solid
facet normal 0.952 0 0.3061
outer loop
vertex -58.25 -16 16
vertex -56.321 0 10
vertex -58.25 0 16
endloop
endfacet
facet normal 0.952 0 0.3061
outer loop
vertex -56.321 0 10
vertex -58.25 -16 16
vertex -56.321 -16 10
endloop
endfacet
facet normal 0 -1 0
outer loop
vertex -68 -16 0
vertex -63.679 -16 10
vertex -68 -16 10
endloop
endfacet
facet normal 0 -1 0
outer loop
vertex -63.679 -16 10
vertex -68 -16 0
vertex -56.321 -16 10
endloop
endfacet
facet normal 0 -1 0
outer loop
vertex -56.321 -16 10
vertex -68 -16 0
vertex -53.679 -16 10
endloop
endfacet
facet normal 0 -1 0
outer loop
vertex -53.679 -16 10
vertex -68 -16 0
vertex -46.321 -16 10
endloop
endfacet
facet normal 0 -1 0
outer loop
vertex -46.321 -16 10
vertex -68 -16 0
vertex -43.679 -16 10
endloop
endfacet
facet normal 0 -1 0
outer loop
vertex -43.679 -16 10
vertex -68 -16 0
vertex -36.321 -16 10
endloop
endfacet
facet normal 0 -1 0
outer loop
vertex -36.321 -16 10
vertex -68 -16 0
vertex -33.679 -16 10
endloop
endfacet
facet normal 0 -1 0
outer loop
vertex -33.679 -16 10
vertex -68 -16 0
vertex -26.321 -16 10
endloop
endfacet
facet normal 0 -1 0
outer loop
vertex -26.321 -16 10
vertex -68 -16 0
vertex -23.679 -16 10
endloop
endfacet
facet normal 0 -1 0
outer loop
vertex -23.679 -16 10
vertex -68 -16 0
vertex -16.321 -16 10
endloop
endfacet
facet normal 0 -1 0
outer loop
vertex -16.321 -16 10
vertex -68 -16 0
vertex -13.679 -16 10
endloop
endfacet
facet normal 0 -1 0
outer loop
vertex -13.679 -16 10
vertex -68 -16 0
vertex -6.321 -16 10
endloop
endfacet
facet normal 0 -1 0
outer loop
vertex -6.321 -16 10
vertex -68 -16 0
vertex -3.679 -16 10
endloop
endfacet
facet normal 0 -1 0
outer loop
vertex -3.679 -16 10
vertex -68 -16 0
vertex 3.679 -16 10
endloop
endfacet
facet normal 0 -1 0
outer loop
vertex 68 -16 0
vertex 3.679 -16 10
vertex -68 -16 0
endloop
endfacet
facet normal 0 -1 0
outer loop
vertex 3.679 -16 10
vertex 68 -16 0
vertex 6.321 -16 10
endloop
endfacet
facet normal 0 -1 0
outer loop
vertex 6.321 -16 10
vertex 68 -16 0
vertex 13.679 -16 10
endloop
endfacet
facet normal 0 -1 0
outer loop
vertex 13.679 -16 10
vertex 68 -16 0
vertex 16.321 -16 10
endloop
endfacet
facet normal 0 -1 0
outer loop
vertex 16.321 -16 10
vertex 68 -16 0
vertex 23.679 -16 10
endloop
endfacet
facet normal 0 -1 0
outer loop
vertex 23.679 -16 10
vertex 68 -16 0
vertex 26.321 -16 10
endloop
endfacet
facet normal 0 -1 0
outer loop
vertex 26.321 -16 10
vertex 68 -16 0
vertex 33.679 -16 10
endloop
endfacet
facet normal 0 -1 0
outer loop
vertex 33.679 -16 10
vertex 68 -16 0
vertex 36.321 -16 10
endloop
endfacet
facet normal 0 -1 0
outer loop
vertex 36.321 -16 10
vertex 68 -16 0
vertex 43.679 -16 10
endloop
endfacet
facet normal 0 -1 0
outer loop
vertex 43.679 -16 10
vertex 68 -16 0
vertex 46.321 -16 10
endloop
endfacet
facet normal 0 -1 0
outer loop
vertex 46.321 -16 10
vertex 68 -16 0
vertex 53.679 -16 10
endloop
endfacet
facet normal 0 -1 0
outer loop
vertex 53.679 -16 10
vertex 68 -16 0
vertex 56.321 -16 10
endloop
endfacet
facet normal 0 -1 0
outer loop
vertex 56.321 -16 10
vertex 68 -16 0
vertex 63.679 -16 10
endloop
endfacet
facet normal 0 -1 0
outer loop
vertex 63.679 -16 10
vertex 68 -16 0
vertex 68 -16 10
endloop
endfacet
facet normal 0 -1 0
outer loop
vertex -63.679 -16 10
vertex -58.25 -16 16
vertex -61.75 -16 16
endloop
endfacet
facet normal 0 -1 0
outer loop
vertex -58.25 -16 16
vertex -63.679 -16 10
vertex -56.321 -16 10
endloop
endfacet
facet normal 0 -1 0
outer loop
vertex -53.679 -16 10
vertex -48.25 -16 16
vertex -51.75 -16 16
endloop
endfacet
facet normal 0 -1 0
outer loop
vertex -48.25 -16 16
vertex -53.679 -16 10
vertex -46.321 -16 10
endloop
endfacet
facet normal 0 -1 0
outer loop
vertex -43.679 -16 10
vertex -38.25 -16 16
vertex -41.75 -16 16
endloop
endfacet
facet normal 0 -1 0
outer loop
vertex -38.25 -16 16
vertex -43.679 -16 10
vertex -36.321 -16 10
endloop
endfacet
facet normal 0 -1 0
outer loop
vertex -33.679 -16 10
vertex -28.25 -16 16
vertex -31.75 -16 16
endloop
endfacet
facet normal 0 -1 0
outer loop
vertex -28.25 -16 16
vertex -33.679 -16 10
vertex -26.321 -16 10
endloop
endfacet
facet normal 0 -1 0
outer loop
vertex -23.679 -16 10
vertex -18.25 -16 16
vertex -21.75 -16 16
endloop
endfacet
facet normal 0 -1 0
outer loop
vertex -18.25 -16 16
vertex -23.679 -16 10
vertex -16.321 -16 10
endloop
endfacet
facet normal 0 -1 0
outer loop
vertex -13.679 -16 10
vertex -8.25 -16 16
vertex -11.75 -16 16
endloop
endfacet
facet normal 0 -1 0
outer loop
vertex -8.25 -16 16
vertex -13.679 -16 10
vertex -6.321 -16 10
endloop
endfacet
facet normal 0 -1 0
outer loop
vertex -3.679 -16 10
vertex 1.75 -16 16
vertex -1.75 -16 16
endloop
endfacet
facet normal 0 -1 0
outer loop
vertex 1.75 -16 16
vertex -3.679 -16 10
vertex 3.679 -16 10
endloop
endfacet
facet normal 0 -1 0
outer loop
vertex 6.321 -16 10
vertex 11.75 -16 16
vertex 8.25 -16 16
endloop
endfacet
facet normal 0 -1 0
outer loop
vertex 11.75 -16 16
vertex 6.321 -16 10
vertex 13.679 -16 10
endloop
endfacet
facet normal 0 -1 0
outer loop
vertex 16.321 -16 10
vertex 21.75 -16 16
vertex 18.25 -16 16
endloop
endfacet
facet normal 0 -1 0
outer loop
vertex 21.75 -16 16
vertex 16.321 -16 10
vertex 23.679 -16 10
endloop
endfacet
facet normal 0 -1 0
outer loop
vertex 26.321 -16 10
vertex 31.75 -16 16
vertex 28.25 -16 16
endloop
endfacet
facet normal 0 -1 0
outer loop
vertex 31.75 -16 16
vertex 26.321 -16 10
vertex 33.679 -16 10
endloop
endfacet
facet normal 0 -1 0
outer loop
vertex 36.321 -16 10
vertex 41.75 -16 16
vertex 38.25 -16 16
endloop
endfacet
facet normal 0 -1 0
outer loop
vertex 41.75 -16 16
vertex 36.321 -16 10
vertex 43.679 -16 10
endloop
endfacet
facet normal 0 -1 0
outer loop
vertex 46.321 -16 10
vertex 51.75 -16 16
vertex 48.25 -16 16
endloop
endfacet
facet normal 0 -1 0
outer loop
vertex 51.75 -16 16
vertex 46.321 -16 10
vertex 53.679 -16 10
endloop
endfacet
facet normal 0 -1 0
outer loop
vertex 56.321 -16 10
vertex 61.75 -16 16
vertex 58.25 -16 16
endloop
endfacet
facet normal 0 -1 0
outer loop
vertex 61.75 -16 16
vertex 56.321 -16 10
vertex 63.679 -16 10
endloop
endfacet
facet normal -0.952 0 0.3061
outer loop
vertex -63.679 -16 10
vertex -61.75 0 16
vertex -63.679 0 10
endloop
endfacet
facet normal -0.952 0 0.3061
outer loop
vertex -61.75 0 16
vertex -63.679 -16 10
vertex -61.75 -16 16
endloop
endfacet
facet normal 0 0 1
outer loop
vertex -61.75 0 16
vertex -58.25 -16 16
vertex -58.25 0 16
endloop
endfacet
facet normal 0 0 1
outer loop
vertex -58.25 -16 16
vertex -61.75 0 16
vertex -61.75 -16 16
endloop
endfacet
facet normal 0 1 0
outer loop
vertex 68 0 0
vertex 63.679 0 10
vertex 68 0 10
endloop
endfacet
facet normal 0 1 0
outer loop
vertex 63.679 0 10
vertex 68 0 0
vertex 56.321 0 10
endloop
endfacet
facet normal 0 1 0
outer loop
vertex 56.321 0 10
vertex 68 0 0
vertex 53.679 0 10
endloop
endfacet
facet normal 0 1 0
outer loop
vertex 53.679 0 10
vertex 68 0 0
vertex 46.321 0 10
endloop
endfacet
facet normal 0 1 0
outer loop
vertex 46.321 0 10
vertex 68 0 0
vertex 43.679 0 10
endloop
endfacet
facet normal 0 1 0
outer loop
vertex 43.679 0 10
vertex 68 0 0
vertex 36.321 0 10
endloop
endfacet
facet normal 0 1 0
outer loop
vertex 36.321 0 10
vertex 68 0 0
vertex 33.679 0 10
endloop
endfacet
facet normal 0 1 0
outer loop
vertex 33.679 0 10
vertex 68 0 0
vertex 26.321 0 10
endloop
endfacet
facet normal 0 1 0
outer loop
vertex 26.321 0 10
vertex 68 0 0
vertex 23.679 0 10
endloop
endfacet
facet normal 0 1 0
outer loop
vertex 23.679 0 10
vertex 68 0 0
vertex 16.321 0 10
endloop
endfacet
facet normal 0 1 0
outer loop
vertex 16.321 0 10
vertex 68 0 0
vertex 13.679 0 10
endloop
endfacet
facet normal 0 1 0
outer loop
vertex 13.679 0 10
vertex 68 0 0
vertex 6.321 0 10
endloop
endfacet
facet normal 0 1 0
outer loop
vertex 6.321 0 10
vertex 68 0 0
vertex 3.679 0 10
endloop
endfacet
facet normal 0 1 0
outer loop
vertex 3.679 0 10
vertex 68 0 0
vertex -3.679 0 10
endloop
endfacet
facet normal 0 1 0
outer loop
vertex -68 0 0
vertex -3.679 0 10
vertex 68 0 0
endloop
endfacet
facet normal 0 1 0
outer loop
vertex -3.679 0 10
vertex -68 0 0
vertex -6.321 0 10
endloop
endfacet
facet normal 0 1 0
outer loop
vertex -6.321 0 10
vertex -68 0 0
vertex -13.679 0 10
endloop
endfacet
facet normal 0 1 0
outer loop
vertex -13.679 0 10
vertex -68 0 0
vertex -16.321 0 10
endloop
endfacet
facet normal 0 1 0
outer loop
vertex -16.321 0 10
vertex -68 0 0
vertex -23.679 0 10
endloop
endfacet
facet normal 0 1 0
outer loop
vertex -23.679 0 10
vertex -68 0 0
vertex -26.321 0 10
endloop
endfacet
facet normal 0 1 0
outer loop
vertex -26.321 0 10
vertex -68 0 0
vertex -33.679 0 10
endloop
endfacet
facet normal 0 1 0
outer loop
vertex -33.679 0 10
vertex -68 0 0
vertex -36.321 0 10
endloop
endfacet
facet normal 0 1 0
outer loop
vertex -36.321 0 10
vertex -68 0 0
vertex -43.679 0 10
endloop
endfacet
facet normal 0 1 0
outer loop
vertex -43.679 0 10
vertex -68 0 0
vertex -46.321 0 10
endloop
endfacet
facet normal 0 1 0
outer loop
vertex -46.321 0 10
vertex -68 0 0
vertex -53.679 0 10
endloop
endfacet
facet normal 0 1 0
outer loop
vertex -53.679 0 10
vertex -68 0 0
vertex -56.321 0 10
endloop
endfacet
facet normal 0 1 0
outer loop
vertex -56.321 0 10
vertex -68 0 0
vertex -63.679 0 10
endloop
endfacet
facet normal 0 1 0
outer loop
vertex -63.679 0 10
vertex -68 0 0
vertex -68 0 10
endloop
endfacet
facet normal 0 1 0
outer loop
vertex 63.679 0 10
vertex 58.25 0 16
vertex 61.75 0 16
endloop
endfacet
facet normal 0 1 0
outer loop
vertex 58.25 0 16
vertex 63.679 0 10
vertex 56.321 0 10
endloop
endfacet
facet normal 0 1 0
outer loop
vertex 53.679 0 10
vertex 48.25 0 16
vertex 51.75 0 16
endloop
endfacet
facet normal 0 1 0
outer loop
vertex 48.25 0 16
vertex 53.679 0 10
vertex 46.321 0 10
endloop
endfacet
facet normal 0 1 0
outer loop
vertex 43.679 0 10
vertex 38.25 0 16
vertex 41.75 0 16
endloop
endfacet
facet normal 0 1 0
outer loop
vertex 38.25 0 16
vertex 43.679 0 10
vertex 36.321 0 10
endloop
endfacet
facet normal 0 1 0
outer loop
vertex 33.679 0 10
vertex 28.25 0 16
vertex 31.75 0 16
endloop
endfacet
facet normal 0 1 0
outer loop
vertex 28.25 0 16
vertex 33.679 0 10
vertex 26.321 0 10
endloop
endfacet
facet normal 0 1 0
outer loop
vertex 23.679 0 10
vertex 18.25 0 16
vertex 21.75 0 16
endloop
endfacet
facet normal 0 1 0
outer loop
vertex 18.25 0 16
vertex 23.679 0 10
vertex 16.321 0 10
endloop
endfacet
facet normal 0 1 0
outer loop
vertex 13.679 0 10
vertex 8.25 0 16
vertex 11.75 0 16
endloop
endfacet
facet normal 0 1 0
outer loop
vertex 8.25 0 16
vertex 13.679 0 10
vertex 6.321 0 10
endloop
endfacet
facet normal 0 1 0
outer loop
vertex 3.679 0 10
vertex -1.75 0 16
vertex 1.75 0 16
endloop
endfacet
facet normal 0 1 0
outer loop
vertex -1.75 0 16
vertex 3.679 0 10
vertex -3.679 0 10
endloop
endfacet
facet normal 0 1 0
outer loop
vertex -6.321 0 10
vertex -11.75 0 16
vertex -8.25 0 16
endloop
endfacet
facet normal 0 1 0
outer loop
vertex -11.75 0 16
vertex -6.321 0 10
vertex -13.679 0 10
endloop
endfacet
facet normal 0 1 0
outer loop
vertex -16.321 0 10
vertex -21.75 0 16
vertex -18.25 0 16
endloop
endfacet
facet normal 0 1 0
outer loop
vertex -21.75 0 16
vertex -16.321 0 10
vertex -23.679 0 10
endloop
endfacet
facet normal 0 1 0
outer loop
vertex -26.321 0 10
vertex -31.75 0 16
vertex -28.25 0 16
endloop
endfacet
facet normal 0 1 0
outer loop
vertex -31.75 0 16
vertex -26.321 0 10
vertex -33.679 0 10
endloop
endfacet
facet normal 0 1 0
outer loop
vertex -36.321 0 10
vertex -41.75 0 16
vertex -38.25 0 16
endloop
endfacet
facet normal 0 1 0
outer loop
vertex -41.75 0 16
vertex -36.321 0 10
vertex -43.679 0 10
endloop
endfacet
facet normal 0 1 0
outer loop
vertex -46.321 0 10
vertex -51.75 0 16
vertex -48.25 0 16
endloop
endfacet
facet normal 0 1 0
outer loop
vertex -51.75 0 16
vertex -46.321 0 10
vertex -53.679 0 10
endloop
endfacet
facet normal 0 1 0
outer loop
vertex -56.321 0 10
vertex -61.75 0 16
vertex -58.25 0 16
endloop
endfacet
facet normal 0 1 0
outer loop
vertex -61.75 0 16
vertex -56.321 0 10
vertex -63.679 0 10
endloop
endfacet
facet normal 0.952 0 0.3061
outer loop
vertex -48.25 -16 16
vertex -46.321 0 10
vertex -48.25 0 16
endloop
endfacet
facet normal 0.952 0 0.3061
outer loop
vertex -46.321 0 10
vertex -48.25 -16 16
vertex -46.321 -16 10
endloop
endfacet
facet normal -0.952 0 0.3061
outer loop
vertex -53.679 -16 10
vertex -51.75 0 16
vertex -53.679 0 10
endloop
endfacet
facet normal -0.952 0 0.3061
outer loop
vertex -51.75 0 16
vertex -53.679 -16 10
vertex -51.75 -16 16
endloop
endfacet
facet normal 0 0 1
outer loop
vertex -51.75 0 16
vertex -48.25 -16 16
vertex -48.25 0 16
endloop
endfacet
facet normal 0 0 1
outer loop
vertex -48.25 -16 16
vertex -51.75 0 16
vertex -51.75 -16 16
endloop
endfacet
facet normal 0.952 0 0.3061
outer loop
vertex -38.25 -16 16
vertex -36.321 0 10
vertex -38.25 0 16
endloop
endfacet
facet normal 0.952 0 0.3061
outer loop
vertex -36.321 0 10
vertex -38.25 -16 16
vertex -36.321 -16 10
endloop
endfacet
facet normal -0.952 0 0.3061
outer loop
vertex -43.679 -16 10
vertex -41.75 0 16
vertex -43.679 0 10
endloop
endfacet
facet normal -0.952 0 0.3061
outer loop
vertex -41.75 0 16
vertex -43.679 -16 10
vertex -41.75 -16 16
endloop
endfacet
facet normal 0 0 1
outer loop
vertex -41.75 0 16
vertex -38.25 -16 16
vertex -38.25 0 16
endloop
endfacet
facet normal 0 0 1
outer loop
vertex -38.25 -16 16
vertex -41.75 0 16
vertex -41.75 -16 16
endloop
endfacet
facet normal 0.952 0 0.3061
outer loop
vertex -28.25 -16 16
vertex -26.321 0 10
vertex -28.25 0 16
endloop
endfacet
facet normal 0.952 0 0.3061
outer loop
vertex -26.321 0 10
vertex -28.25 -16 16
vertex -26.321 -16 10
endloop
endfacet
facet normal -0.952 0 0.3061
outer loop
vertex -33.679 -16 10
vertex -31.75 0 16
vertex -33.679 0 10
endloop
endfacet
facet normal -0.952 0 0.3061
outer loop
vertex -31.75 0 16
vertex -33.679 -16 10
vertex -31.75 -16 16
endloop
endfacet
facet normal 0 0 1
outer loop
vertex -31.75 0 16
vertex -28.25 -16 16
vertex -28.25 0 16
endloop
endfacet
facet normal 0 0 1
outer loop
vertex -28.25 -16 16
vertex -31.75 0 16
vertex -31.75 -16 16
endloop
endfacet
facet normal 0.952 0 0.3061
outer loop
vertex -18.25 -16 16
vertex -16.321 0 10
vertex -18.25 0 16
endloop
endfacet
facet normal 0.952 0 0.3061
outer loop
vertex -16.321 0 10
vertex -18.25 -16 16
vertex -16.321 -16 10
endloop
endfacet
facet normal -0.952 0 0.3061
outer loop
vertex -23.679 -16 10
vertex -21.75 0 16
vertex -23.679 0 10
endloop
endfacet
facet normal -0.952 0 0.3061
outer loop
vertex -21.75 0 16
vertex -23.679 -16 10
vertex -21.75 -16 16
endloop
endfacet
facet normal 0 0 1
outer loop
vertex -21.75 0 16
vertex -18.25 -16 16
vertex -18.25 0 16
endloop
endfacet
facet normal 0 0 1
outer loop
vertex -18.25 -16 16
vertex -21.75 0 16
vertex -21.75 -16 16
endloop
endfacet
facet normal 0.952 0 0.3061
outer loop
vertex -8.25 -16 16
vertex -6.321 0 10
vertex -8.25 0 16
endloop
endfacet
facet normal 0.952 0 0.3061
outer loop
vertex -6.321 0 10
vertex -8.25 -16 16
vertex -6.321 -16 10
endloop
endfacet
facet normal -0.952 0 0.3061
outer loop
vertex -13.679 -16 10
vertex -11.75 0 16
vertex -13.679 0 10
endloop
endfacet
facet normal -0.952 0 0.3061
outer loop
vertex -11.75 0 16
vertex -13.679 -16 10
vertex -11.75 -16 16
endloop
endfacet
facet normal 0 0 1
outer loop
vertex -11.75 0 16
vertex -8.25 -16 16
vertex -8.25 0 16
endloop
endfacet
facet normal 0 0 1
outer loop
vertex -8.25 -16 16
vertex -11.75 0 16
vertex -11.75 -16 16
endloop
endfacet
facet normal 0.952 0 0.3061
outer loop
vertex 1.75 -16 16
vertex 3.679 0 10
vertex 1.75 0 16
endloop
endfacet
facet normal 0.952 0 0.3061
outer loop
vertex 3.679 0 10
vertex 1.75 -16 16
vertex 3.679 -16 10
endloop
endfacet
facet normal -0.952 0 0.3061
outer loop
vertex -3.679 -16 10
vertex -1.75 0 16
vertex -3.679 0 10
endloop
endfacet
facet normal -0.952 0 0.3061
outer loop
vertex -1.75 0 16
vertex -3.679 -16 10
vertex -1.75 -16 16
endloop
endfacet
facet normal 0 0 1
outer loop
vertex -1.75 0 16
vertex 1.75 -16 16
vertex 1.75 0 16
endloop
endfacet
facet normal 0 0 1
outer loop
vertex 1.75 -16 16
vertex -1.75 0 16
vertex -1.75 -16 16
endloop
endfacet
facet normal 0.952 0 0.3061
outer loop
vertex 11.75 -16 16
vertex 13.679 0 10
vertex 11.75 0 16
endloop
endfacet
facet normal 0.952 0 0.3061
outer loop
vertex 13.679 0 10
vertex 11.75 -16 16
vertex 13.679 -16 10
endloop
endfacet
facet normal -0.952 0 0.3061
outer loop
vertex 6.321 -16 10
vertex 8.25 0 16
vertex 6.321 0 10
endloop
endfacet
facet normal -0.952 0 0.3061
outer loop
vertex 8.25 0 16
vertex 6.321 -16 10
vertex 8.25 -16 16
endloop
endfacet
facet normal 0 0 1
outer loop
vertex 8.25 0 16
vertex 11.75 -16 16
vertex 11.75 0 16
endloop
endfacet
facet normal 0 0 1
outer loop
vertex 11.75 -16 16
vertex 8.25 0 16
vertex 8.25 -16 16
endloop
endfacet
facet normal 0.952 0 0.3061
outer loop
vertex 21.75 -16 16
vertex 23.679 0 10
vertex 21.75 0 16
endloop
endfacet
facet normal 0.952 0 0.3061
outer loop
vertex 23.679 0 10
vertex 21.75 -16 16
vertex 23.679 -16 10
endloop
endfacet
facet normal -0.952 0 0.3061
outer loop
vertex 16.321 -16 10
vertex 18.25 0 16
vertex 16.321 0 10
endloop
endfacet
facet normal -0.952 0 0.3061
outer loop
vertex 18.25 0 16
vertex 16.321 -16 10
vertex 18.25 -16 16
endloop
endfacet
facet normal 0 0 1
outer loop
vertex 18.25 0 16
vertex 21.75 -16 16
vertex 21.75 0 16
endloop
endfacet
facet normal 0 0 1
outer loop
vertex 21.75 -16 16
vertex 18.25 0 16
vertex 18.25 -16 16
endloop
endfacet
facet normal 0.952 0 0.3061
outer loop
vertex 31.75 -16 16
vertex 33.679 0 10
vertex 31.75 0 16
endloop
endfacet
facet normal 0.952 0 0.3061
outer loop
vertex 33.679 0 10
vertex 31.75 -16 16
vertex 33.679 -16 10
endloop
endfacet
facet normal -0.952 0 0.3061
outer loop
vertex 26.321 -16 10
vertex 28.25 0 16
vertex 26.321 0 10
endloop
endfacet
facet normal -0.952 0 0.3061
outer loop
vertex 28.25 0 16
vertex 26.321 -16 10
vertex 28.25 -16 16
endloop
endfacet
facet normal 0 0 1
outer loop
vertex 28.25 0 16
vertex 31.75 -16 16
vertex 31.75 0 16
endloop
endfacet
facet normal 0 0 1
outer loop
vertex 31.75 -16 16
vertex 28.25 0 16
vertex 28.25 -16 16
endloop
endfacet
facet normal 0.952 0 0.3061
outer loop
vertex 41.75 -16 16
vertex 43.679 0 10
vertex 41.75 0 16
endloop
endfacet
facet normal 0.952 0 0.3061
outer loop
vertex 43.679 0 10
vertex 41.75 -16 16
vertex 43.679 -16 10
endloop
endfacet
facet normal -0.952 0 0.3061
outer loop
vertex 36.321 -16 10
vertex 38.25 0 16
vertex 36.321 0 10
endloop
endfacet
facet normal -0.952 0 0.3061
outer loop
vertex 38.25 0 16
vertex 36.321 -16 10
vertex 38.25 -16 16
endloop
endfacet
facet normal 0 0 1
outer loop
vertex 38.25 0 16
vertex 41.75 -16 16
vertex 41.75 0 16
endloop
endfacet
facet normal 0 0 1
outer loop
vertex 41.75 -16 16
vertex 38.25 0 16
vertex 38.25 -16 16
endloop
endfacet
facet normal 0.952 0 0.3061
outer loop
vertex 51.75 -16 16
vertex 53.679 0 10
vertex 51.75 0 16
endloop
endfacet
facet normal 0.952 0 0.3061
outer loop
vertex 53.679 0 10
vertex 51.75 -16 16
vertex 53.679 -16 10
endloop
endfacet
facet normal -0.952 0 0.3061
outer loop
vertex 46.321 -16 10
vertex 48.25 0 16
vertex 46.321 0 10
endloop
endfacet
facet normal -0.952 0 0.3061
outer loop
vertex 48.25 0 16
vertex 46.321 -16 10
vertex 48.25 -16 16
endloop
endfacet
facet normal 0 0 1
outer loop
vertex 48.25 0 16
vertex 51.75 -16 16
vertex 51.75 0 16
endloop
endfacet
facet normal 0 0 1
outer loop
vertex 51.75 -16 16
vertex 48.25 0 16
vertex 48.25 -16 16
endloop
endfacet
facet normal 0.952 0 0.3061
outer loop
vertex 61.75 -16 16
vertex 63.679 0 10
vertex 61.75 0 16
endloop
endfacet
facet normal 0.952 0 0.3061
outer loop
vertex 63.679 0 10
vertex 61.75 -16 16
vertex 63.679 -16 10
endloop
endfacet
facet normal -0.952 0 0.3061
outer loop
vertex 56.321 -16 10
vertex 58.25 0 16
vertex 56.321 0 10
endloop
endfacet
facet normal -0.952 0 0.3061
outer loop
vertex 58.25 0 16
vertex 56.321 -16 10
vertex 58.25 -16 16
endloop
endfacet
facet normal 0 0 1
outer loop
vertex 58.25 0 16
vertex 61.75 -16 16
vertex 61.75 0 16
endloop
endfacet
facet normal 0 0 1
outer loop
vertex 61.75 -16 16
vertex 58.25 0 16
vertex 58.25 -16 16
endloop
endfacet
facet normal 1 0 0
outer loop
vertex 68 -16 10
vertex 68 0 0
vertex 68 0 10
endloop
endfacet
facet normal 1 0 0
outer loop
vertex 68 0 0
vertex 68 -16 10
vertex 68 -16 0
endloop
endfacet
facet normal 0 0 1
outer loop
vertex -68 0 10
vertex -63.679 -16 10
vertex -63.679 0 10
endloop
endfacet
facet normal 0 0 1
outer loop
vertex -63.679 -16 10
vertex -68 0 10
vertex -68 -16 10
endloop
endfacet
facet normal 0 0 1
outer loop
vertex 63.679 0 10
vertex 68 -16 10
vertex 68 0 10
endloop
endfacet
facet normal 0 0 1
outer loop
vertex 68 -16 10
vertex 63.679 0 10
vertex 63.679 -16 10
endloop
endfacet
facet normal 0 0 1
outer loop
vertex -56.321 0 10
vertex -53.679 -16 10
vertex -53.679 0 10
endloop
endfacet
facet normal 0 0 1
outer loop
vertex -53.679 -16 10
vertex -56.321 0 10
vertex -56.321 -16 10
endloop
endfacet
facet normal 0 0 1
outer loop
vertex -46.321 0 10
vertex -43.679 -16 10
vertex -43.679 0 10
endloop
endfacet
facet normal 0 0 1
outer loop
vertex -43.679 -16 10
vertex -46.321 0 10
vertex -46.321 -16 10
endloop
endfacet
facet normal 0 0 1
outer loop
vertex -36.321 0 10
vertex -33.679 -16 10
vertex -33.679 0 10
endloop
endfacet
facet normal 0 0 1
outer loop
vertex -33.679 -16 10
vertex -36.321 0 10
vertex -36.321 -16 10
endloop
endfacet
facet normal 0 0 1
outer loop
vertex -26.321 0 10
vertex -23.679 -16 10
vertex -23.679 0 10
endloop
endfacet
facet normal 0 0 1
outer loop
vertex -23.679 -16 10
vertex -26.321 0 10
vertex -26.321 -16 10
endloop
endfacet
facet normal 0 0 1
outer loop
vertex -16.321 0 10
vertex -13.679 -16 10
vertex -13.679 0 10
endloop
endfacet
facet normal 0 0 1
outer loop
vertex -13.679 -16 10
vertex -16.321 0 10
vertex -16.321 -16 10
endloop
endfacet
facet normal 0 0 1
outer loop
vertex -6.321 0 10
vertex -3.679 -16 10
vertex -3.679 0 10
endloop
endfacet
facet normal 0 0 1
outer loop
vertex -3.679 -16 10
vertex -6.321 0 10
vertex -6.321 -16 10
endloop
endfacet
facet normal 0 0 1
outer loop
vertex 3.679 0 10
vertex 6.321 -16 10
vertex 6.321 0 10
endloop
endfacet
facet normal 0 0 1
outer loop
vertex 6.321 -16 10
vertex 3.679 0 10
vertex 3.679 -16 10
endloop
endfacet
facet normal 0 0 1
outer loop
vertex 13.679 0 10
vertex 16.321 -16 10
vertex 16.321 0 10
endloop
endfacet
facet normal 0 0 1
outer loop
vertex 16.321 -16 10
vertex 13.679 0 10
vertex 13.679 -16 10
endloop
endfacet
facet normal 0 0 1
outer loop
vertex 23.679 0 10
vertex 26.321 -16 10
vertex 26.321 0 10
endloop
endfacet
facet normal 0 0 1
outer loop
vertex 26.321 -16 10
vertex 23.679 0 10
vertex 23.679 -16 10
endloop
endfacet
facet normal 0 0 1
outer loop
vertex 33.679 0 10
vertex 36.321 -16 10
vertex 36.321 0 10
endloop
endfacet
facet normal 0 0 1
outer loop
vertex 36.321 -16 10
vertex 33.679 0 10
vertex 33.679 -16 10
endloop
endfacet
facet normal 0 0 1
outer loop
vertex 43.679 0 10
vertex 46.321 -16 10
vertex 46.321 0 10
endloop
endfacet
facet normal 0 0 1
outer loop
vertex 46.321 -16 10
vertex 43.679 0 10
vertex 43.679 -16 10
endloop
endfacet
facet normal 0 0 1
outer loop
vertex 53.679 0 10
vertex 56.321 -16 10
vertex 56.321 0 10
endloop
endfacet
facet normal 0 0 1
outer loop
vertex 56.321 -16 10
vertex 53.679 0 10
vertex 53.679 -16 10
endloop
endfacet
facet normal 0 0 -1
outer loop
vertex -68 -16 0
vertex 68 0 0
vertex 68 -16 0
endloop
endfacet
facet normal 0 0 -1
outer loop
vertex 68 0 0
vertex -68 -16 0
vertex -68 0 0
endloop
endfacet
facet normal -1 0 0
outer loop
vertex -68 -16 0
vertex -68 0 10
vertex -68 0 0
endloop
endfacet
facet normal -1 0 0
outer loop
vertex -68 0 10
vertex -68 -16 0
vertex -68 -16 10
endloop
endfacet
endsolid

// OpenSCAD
$fn = 32;

// ----------------------------------------------------------------------
// Toothed rack, 13 teeth
// 10 mm pitch, 6 mm teeth
// ----------------------------------------------------------------------

// --- parameters (mm) ---
bar_w = 16;     // bar width (Y)
bar_h = 10;     // bar height (Z)
teeth = 13;     // number of teeth
pitch = 10;     // tooth pitch
tooth_h = 6;    // tooth height above the bar
root_w = 8;     // tooth width at the root
crest_w = 3.5;  // tooth width at the crest

// --- derived feature positions (mm) ---
span = (teeth - 1) * pitch;  // = 120   distance between the outer teeth
bar_l = span + root_w + 8;   // = 136   bar length: teeth plus 4 mm at each end
tooth_x = -span / 2;         // = -60   X of the first tooth
height = bar_h + tooth_h;    // = 16   overall height
feature_centers = [
  [tooth_x + 0 * pitch, -bar_w / 2],
  [tooth_x + 1 * pitch, -bar_w / 2],
  [tooth_x + 2 * pitch, -bar_w / 2],
  [tooth_x + 3 * pitch, -bar_w / 2],
  [tooth_x + 4 * pitch, -bar_w / 2],
  [tooth_x + 5 * pitch, -bar_w / 2],
  [tooth_x + 6 * pitch, -bar_w / 2],
  [tooth_x + 7 * pitch, -bar_w / 2],
  [tooth_x + 8 * pitch, -bar_w / 2],
  [tooth_x + 9 * pitch, -bar_w / 2],
  [tooth_x + 10 * pitch, -bar_w / 2],
  [tooth_x + 11 * pitch, -bar_w / 2],
  [tooth_x + 12 * pitch, -bar_w / 2]
];   // tooth centre line, drives the tooth loop

// bar with a rack of teeth, one extruded trapezoium per centre
module rack_tooth() {
  linear_extrude(height = bar_w)
    polygon(points = [
      [0, 0],
      [root_w, 0],
      [root_w / 2 + crest_w / 2, tooth_h + 1],
      [root_w / 2 - crest_w / 2, tooth_h + 1]
    ]);
}

union() {
  translate([-bar_l / 2, -bar_w, 0]) cube([bar_l, bar_w, bar_h]);
  for (centre = feature_centers)
    translate([centre[0] - root_w / 2, 0, bar_h - 1]) rotate([90, 0, 0]) rack_tooth();
}
